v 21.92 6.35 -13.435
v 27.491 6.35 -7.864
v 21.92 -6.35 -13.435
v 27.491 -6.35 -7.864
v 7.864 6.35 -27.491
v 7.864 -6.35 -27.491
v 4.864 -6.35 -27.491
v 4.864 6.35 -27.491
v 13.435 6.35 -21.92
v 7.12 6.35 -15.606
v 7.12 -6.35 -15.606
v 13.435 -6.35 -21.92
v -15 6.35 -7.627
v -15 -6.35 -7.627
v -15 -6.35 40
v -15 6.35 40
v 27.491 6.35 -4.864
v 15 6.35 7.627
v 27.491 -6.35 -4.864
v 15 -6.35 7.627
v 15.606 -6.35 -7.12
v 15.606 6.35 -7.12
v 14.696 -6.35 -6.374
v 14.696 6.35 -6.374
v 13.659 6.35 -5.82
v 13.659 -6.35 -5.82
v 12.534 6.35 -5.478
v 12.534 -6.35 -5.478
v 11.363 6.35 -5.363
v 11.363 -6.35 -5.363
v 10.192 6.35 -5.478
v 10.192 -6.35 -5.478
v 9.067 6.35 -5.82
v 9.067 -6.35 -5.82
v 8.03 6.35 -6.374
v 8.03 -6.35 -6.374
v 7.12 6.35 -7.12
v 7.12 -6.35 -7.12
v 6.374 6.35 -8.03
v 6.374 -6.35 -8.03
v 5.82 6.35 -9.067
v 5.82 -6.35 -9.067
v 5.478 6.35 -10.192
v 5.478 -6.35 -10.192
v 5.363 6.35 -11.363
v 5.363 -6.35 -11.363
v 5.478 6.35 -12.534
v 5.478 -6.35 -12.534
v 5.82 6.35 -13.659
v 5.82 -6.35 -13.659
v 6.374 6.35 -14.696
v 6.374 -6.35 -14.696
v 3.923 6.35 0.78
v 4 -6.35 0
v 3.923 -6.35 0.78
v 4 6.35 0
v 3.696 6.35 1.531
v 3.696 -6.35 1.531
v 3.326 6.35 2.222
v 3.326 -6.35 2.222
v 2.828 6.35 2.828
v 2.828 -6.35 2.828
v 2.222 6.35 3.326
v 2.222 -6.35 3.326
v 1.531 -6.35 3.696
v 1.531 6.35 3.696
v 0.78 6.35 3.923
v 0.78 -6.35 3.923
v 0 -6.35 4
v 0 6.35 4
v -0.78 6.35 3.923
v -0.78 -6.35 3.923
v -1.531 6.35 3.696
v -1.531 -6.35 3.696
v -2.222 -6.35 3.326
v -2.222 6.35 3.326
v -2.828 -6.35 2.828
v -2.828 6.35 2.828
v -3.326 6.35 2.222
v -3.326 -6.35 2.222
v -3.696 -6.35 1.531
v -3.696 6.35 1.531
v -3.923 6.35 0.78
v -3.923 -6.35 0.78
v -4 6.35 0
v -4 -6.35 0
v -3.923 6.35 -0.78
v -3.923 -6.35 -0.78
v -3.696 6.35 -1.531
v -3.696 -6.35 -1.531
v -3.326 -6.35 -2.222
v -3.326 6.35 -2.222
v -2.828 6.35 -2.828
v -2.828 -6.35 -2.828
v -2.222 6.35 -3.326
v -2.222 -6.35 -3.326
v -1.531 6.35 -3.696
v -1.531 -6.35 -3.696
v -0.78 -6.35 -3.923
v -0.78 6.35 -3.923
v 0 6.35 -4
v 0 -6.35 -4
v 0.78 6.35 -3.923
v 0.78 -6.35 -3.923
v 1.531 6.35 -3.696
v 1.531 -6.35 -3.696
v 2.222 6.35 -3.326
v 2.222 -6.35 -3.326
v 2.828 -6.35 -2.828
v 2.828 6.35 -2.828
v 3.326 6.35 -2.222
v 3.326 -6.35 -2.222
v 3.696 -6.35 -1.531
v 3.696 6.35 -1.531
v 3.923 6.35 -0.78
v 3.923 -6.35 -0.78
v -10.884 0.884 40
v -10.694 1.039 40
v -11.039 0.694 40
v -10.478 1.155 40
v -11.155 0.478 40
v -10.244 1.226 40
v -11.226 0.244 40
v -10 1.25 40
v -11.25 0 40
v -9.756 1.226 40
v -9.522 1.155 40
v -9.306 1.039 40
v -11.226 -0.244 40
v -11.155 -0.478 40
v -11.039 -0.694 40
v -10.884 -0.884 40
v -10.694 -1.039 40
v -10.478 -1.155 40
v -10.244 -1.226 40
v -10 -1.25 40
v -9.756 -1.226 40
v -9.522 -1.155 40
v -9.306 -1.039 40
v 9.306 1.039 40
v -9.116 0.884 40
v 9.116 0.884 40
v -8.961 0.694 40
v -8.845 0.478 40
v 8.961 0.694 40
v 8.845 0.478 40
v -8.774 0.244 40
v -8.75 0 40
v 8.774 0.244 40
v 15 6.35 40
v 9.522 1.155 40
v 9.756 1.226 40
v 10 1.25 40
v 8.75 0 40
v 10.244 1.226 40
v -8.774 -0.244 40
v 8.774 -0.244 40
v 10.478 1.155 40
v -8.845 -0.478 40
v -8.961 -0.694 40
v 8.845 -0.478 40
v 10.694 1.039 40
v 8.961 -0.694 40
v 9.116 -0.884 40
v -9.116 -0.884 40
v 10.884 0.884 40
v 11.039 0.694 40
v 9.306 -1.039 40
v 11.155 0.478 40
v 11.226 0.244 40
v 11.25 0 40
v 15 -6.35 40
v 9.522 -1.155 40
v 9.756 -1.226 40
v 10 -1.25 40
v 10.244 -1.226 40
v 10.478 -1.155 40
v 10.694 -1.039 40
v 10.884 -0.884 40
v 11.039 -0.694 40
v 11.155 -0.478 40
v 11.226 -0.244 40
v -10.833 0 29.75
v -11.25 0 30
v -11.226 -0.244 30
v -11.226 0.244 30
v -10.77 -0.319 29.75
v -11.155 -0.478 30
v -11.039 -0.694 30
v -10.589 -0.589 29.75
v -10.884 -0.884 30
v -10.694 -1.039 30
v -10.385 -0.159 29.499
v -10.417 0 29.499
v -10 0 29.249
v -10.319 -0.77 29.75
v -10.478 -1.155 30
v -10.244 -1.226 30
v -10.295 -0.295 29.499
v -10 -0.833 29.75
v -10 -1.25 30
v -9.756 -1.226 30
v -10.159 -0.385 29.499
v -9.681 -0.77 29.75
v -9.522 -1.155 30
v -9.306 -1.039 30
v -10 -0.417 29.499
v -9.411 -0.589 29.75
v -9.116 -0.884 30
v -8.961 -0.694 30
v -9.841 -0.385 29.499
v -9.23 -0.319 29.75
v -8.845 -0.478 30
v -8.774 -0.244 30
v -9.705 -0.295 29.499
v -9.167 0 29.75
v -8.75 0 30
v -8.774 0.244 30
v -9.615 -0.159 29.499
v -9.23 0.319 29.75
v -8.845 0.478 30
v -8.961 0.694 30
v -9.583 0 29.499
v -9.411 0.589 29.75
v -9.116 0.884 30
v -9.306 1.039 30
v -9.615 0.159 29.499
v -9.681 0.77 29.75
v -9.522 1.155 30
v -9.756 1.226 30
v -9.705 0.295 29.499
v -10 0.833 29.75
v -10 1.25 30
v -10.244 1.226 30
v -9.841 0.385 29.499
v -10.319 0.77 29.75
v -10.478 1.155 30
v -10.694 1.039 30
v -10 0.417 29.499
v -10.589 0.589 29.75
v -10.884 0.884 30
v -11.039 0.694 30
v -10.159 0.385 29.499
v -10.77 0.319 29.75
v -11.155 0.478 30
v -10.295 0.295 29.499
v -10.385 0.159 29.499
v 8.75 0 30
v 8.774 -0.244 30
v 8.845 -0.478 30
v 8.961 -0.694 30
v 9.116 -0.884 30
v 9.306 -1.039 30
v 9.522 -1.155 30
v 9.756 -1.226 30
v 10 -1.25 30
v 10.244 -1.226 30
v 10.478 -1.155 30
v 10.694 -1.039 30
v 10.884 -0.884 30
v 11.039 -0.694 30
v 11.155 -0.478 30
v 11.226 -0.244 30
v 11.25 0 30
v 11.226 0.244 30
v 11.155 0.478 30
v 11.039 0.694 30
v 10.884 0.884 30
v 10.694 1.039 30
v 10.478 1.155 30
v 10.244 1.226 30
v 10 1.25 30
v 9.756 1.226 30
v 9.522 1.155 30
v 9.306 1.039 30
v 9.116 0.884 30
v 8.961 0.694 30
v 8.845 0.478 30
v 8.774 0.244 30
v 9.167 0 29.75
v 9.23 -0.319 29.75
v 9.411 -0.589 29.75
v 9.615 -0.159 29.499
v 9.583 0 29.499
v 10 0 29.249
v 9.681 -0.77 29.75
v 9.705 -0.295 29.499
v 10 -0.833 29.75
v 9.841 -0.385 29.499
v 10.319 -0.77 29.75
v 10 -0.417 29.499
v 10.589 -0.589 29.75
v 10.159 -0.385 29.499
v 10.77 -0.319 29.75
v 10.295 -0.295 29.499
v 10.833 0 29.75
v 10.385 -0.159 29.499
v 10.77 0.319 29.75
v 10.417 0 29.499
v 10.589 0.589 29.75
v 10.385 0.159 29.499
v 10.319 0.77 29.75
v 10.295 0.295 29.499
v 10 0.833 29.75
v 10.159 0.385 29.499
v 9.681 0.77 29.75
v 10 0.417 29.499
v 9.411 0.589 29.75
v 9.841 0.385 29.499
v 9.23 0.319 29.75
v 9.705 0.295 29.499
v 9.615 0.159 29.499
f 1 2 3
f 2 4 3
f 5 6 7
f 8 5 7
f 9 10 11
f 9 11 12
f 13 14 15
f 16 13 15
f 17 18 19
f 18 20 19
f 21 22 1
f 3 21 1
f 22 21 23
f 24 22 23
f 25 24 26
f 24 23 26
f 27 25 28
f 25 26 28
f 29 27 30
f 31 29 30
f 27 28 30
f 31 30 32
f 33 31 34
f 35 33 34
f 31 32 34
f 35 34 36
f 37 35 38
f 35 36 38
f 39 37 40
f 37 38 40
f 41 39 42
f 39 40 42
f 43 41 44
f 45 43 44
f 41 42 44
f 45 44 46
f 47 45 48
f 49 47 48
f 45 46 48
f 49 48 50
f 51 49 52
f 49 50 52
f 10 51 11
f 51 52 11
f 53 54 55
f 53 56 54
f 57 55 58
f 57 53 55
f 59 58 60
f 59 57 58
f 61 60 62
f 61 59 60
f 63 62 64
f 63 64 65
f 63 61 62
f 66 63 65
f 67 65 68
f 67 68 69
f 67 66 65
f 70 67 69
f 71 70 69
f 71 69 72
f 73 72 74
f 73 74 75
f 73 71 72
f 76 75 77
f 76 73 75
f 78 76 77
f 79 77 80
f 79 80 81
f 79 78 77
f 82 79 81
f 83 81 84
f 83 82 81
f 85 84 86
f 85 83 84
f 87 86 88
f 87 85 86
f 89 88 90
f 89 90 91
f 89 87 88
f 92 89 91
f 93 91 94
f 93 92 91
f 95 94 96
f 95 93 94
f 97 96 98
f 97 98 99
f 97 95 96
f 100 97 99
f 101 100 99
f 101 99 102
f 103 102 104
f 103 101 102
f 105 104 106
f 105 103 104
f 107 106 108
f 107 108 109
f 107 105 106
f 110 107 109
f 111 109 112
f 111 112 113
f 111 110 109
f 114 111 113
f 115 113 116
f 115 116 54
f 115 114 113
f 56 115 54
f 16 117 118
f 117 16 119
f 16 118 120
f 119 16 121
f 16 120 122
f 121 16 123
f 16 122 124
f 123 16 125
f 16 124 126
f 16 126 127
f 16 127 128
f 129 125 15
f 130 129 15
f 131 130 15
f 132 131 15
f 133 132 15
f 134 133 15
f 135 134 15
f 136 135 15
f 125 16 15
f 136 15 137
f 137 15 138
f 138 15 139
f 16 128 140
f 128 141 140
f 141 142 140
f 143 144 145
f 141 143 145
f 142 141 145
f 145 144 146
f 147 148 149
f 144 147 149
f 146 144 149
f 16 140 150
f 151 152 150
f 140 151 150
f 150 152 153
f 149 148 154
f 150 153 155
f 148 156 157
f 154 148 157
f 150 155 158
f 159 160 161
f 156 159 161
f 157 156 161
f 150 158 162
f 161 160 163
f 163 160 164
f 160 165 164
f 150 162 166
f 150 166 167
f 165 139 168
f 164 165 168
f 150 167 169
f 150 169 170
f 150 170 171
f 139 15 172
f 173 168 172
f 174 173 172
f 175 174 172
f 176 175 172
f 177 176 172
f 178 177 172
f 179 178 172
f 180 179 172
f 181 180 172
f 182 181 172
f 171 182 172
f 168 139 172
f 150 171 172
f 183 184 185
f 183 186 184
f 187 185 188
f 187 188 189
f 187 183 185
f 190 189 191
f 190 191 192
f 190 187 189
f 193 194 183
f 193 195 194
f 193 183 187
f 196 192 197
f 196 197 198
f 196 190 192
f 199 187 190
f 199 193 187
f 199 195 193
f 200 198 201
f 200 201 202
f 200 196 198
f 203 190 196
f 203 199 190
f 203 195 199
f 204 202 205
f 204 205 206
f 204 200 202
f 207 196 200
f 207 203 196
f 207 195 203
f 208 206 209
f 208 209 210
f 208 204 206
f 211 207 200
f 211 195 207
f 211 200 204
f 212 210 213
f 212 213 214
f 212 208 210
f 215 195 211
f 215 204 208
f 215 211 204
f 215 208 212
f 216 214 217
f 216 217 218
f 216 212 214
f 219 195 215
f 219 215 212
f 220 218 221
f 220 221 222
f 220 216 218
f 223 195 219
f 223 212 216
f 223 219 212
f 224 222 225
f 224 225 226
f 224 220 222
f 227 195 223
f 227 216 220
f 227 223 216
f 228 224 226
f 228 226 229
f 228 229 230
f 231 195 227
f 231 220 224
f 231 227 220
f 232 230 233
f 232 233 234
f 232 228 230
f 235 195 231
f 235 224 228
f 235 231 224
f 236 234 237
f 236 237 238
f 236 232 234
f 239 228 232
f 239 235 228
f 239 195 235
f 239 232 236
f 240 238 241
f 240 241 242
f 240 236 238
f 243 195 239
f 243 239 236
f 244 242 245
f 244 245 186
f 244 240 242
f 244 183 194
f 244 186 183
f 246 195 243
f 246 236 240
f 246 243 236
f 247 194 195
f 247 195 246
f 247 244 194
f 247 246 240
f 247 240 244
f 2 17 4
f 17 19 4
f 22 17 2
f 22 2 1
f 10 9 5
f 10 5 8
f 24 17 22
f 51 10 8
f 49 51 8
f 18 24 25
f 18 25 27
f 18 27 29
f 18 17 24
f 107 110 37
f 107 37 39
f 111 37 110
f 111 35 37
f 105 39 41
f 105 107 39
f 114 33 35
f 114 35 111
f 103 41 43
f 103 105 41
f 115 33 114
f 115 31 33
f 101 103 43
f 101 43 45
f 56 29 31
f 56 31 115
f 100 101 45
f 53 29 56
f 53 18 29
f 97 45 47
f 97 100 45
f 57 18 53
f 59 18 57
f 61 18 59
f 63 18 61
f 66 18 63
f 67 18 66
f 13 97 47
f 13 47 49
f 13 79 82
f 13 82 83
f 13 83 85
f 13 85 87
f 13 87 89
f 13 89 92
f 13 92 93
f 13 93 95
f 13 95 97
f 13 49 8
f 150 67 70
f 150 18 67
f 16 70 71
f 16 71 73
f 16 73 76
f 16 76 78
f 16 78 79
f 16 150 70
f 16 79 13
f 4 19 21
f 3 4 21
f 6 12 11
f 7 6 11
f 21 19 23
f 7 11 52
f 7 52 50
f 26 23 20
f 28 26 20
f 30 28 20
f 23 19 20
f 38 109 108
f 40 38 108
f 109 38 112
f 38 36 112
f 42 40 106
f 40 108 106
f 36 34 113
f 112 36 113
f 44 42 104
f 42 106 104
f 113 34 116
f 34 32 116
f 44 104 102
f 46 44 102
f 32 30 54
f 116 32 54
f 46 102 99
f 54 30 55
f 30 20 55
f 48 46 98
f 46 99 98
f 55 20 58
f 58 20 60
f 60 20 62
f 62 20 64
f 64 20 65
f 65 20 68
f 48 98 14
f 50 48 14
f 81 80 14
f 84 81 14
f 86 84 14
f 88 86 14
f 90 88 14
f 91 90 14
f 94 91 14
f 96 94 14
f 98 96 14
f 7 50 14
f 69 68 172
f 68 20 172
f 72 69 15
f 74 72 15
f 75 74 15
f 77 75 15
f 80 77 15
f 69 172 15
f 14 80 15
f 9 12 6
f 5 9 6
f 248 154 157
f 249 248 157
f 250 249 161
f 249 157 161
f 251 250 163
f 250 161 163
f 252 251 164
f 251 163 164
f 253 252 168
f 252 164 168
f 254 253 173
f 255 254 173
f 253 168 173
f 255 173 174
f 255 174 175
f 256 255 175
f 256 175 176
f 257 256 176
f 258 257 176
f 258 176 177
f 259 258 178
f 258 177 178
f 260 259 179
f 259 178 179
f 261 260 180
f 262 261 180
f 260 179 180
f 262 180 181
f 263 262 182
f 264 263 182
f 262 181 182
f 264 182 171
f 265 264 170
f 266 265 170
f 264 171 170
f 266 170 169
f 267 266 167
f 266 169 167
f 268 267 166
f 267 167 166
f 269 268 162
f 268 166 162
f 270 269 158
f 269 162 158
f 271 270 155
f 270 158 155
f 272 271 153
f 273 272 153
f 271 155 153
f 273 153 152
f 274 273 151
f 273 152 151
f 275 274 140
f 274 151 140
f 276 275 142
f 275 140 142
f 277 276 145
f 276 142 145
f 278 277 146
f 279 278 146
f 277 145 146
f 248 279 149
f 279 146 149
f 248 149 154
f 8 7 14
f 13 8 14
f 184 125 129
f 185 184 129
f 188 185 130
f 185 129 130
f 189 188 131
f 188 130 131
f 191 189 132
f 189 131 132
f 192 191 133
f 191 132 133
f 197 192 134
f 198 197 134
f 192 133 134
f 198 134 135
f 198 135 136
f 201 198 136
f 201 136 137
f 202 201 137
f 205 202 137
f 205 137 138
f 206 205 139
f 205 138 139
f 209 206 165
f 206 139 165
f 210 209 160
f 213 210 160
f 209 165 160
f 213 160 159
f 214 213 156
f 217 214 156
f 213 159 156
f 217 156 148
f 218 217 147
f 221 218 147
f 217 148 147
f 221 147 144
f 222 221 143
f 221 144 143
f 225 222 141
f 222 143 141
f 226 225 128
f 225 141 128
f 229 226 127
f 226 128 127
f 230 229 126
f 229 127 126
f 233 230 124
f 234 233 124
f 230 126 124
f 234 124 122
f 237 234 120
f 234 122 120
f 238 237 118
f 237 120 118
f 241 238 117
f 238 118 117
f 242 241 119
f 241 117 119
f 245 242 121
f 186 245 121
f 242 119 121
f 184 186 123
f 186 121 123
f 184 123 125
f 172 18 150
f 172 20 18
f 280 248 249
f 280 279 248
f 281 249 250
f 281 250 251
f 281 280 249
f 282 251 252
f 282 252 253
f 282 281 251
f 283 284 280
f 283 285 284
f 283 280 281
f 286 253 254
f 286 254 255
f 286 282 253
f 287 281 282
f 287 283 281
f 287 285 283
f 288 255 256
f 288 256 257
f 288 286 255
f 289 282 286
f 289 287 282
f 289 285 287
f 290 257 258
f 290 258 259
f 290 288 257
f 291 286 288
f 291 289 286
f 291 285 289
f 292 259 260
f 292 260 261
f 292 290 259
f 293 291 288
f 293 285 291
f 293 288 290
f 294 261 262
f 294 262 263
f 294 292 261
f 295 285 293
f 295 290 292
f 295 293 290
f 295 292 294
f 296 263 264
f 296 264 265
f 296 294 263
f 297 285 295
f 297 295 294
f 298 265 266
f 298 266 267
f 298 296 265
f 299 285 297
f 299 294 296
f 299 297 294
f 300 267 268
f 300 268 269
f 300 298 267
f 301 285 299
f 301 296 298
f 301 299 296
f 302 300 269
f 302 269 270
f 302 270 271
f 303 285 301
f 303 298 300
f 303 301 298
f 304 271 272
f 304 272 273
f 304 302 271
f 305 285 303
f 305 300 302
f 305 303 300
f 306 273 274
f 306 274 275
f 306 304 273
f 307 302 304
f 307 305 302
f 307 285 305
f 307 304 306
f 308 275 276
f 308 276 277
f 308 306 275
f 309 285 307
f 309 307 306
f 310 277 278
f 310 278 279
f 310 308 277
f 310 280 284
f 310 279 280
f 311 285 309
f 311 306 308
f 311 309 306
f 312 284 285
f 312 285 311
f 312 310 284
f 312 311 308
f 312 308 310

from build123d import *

# Parameters (mm, degrees)
SKETCH_R    = 4
PAD_DEPTH   = 6.35
SKETCH001_R = 1.25
HOLE_DEPTH  = 10
HOLE_TIPS_R = 1.25


with BuildPart() as part:
    # Sketch → Pad (new body, symmetric)
    with BuildSketch(Plane.XZ):
        with BuildLine():
            Line((-15, -7.62744), (-15, 40))
            Line((-15, 40), (15, 40))
            Line((15, 7.627403), (15, 40))
            Line((15, 7.627403), (27.491385, -4.863982))
            Line((27.491385, -4.863982), (27.491385, -7.863982))
            Line((27.491385, -7.863982), (21.920307, -13.435044))
            Line((15.605634, -7.120352), (21.920307, -13.435044))
            ThreePointArc((15.605634, -7.120352), (7.120352, -7.12034), (7.12034, -15.605621))
            Line((7.12034, -15.605621), (13.435014, -21.920313))
            Line((13.435014, -21.920313), (7.863944, -27.491383))
            Line((7.863944, -27.491383), (4.863944, -27.491383))
            Line((4.863944, -27.491383), (-15, -7.62744))
        make_face()
        Circle(SKETCH_R, mode=Mode.SUBTRACT)
    extrude(amount=PAD_DEPTH, both=True)

    # Sketch001 (on Face7 of Pad) → Hole (cut)
    with BuildSketch(Plane(origin=(0, 0, 40), x_dir=(-1, 0, 0), z_dir=(0, 0, 1))):
        with Locations((-10, 0)):
            Circle(SKETCH001_R)
        with Locations((10, 0)):
            Circle(SKETCH001_R)
    extrude(amount=-HOLE_DEPTH, mode=Mode.SUBTRACT)

    # Hole tips → Hole tip 1 section 0
    with BuildSketch(Plane(origin=(0, 0, 30), x_dir=(-1, 0, 0), z_dir=(0, 0, 1)), mode=Mode.PRIVATE) as hole_tip_1_s0:
        with Locations((-10, 0)):
            Circle(HOLE_TIPS_R)
    loft([hole_tip_1_s0.sketch, Vertex(10, 0, 29.248924)], mode=Mode.SUBTRACT)

    # Hole tips → Hole tip 2 section 0
    with BuildSketch(Plane(origin=(0, 0, 30), x_dir=(-1, 0, 0), z_dir=(0, 0, 1)), mode=Mode.PRIVATE) as hole_tip_2_s0:
        with Locations((10, 0)):
            Circle(HOLE_TIPS_R)
    loft([hole_tip_2_s0.sketch, Vertex(-10, 0, 29.248924)], mode=Mode.SUBTRACT)


solid = part.part
